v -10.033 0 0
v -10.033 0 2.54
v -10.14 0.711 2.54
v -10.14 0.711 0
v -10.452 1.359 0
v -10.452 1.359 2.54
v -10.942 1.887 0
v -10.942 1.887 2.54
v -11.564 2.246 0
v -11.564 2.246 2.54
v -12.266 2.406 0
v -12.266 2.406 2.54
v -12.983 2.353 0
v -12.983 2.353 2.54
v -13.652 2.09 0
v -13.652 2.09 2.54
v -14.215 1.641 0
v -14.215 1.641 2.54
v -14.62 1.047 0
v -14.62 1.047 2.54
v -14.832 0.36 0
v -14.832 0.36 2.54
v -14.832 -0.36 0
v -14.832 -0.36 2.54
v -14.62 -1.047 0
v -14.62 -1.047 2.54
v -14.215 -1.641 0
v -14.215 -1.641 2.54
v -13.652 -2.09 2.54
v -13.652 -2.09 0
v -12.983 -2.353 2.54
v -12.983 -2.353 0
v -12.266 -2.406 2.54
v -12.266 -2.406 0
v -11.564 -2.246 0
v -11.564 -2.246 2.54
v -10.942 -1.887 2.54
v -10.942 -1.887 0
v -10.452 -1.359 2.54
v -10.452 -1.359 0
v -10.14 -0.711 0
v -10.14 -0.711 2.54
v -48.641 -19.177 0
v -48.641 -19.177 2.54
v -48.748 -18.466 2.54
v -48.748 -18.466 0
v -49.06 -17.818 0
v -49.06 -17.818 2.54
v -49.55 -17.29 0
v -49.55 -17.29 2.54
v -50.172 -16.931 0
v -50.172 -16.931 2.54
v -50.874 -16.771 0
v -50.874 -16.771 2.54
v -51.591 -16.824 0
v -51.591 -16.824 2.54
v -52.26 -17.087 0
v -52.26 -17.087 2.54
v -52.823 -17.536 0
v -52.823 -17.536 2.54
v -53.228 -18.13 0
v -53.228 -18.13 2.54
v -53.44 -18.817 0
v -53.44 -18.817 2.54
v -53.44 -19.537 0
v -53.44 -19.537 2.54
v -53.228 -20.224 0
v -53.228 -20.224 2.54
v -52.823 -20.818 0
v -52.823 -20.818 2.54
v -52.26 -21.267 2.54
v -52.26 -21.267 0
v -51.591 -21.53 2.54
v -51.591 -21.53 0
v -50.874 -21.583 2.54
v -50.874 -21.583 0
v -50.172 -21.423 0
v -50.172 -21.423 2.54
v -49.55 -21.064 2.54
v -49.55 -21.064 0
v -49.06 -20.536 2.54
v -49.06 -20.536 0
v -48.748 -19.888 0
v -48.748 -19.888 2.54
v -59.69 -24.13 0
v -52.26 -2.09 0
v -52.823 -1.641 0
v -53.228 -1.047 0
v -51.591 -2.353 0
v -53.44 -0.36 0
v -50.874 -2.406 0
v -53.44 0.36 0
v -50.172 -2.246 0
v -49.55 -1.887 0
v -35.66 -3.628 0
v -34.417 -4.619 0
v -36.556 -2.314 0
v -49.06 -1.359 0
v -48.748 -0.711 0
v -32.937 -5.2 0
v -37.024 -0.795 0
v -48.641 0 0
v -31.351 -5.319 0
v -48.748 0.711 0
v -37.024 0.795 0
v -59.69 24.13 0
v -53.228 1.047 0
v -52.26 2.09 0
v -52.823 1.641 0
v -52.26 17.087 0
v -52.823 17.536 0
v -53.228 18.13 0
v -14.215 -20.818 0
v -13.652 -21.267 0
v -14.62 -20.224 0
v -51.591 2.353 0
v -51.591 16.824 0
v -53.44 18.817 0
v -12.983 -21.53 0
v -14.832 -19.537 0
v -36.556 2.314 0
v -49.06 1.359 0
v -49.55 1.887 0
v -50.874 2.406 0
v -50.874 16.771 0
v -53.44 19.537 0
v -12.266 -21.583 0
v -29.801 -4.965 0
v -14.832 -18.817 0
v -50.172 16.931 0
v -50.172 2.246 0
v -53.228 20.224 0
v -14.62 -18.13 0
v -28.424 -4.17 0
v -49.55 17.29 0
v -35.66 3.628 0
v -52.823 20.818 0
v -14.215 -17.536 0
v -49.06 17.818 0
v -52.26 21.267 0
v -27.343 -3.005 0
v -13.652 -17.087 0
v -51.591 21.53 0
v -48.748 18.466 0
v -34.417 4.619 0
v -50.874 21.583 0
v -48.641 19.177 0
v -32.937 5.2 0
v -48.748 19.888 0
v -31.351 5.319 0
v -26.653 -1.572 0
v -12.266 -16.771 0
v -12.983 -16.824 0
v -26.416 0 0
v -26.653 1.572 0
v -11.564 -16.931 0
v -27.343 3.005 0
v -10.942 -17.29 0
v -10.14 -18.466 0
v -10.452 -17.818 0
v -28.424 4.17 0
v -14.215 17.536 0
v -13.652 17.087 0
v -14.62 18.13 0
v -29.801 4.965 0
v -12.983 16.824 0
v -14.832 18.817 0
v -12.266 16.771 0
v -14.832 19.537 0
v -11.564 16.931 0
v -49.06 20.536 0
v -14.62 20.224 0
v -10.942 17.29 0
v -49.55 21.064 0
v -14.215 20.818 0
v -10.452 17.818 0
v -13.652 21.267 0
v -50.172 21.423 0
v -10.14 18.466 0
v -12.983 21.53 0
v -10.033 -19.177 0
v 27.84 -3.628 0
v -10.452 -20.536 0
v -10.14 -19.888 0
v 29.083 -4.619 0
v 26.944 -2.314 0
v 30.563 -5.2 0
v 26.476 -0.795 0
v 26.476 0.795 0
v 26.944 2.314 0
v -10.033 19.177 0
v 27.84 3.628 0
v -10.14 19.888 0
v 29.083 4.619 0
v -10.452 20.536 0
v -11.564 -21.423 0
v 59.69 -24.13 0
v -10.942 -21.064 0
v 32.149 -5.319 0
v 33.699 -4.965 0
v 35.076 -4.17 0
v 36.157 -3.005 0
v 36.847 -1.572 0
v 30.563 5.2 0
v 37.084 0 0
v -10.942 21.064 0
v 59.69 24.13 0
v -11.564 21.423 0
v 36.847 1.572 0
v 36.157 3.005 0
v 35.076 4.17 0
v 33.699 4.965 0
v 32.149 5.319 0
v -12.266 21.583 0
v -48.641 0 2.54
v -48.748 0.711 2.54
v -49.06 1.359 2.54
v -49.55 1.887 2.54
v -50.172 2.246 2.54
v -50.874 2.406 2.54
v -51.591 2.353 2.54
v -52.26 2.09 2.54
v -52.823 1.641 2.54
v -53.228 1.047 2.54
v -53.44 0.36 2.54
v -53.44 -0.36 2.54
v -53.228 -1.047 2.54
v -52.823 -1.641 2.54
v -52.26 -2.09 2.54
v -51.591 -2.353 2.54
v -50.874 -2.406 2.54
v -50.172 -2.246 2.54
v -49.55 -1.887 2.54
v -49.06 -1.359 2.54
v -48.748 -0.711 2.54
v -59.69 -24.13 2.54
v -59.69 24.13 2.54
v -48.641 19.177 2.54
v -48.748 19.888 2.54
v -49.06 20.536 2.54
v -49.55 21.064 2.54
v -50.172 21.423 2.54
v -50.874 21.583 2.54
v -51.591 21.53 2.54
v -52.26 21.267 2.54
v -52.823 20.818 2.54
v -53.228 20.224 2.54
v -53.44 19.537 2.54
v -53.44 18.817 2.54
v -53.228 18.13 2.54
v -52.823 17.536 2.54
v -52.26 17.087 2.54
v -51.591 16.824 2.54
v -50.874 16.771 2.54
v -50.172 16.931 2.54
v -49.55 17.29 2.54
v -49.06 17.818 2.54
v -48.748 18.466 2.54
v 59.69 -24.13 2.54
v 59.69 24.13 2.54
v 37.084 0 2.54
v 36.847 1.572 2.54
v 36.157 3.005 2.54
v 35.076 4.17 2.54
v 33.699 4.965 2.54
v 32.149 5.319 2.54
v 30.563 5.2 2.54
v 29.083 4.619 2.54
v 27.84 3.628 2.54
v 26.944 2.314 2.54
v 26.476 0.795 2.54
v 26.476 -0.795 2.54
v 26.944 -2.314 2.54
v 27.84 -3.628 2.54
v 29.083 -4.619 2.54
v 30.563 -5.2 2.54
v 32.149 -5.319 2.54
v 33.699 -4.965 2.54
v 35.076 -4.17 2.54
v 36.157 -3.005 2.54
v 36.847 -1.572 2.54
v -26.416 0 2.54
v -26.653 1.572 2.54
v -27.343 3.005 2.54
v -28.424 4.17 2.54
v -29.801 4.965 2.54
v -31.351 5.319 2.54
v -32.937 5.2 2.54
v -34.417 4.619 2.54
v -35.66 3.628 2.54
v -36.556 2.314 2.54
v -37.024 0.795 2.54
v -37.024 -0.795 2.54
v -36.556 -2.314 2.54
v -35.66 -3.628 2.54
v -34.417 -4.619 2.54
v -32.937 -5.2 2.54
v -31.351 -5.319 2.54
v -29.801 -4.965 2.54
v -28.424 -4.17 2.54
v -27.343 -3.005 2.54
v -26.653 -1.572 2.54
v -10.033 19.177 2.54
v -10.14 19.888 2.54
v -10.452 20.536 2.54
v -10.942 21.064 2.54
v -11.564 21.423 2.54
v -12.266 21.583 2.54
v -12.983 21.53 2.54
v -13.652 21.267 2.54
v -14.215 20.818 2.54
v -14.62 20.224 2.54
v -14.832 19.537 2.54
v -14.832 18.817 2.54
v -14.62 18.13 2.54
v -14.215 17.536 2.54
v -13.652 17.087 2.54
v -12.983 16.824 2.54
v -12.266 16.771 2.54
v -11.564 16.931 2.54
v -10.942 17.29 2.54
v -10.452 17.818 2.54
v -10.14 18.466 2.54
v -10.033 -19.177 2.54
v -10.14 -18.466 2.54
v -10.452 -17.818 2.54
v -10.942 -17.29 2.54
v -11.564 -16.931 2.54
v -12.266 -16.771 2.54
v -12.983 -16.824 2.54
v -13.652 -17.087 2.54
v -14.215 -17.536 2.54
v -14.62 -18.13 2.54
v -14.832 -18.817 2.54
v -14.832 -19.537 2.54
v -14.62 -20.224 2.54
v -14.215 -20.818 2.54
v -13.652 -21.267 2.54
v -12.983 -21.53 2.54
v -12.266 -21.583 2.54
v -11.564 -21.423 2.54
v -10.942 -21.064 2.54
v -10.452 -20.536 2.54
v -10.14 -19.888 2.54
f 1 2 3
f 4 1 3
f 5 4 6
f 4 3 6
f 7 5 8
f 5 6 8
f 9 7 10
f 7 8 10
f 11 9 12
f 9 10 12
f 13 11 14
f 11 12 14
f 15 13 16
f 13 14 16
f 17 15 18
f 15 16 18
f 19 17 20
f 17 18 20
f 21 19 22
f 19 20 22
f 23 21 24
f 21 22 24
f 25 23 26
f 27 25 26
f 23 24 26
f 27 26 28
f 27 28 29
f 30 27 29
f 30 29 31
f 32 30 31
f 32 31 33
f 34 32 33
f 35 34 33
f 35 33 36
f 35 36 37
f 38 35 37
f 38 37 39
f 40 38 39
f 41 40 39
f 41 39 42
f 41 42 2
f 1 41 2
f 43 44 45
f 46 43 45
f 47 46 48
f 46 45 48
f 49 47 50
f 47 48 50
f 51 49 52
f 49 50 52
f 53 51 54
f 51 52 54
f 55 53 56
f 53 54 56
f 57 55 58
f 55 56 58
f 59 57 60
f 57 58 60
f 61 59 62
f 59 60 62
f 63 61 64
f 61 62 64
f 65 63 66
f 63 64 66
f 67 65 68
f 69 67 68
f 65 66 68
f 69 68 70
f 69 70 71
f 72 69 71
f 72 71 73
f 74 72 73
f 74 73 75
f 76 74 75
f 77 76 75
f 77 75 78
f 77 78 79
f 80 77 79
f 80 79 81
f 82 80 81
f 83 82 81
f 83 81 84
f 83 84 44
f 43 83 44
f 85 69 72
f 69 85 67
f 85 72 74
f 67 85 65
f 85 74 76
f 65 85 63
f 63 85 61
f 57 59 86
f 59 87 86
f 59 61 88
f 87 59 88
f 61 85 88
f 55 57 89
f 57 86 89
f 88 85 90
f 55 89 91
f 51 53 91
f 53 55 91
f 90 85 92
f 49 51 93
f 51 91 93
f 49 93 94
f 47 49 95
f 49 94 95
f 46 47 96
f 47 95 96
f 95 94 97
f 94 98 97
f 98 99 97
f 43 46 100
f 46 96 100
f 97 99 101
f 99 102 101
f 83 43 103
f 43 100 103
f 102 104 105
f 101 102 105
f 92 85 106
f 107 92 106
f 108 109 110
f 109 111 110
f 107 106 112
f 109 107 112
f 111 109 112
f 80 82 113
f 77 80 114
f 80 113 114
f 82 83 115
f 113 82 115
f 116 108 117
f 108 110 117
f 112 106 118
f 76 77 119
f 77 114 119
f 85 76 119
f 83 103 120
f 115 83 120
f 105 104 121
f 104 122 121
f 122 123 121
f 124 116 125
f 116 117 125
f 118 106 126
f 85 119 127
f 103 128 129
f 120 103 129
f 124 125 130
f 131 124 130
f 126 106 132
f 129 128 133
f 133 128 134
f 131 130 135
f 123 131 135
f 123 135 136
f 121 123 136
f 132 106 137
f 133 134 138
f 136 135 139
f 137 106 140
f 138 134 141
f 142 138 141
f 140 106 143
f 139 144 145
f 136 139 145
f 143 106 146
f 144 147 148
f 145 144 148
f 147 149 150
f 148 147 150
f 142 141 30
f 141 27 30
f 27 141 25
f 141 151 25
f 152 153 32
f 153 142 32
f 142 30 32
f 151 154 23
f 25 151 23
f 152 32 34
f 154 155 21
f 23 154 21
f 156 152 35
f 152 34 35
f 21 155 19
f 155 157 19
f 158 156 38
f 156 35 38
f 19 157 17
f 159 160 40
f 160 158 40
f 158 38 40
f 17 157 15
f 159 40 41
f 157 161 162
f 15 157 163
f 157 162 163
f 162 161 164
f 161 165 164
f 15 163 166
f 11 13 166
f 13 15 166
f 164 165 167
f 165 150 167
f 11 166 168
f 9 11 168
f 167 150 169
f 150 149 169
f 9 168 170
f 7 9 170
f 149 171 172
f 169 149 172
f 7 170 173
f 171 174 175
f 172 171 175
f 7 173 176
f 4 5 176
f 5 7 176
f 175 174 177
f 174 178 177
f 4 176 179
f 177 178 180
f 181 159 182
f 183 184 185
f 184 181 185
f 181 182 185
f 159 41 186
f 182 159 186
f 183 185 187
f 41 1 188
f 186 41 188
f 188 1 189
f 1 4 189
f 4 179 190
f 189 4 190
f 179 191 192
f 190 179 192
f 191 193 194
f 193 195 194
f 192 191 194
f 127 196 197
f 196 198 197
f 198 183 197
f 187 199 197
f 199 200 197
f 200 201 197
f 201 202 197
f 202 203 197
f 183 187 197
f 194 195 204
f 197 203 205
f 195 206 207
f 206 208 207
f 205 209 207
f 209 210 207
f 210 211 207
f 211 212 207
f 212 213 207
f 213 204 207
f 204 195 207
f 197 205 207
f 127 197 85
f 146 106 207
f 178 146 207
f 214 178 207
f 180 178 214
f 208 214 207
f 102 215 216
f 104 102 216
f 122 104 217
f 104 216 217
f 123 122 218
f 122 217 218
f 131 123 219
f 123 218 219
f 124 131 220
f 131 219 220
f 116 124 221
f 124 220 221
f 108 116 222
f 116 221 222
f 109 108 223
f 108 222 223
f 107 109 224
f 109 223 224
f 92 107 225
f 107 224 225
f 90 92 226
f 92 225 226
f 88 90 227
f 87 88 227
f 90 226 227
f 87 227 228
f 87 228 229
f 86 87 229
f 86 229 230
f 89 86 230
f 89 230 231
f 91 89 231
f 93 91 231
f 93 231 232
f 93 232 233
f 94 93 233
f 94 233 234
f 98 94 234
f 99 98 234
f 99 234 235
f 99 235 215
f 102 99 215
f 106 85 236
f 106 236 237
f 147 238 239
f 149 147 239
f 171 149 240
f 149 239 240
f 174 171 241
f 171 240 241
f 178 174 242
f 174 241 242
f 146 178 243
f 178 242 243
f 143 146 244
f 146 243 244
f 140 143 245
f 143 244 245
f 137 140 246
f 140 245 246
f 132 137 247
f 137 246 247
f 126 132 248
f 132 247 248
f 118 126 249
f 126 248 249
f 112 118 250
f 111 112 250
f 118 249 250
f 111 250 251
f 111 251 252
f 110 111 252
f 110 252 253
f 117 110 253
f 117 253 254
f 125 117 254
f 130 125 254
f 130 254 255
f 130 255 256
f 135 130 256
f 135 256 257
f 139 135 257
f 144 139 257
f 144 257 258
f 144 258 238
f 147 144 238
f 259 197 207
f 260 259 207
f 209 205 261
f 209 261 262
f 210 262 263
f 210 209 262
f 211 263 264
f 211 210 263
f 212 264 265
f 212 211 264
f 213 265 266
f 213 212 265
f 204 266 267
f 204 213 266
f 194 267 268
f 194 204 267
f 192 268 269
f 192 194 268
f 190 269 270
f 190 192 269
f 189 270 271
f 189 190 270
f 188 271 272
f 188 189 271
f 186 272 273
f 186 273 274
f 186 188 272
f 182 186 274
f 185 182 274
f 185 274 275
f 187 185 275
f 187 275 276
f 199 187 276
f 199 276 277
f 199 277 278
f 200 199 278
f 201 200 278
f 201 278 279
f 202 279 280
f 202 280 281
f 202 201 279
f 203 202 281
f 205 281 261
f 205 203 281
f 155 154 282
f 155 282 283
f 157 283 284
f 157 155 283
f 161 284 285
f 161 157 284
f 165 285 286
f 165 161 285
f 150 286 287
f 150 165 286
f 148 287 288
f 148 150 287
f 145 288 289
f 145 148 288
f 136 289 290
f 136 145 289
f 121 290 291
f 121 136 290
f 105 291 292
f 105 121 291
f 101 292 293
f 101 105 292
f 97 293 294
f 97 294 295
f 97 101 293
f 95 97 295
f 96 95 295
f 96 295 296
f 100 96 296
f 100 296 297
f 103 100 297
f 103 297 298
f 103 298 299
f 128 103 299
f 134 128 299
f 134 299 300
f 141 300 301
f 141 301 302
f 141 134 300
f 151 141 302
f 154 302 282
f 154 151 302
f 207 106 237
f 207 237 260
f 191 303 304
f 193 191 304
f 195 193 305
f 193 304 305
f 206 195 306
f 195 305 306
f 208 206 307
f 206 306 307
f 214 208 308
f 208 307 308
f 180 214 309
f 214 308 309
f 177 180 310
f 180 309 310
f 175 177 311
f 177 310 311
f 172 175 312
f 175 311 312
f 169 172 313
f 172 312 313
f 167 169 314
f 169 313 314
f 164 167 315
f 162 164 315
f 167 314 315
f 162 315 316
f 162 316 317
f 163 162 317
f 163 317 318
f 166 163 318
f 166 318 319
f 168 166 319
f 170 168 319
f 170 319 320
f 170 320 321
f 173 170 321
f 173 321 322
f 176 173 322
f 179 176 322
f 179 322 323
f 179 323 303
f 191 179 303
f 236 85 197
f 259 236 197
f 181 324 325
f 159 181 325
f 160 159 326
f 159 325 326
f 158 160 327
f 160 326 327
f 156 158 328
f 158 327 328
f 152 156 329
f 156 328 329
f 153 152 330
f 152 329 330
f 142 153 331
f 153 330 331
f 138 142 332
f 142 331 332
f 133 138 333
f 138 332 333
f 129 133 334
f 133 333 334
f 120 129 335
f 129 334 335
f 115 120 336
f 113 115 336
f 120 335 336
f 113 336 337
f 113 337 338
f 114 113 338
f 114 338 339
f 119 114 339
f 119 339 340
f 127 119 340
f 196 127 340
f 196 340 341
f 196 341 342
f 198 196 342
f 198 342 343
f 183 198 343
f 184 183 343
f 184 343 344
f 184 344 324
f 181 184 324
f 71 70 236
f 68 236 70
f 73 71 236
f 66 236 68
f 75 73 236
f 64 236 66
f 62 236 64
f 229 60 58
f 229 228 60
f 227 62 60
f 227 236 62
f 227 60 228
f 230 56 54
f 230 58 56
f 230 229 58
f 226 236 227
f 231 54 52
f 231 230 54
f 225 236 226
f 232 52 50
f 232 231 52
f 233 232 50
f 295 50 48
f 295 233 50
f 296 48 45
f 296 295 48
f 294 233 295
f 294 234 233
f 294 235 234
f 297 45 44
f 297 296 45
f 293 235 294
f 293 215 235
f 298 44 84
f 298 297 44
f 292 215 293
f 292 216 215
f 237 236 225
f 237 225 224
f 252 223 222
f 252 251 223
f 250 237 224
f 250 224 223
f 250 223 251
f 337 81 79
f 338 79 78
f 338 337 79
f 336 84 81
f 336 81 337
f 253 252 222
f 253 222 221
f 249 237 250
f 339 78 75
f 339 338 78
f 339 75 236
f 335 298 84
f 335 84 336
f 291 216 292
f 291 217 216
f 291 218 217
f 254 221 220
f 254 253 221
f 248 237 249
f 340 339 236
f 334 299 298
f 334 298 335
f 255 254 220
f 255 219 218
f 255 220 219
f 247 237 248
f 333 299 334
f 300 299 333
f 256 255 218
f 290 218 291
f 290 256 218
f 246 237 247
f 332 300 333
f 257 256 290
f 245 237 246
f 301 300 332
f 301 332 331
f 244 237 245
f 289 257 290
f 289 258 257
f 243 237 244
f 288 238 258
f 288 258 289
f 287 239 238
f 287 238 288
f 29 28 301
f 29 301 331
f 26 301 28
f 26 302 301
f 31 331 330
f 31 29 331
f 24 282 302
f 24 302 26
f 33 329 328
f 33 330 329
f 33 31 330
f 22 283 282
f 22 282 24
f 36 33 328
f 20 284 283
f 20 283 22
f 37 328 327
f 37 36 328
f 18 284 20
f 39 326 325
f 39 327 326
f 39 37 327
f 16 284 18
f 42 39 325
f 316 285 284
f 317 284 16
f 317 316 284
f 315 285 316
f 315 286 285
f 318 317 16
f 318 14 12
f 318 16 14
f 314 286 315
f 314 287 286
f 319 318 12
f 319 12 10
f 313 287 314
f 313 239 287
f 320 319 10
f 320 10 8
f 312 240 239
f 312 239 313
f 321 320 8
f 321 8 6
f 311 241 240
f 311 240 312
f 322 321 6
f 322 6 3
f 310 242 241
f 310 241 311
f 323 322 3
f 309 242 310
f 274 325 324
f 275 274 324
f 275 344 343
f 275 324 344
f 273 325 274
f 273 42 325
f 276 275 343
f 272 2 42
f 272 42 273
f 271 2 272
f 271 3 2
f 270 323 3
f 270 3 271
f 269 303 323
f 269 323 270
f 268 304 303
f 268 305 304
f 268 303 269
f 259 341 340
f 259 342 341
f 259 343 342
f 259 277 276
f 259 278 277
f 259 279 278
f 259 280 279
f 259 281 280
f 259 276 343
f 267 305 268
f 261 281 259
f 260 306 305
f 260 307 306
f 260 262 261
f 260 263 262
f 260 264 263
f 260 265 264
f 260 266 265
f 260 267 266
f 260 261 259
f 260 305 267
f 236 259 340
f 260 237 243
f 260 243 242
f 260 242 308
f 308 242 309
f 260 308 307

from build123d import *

# Parameters (mm, degrees)
F0_W     = 119.38
F0_H     = 48.26
F0_R     = 5.334
F1_DEPTH = 2.54
F2_DEPTH = 2.54
F3_R     = 2.413
F4_DEPTH = 2.541
F5_R     = 2.413
F6_DEPTH = 2.541


with BuildPart() as f1:
    # F0 (on Top) → F1 (new body)
    with BuildSketch(Plane.XY):
        Rectangle(F0_W, F0_H)
        with Locations((-31.75, 0)):
            Circle(F0_R, mode=Mode.SUBTRACT)
        with Locations((31.75, 0)):
            Circle(F0_R, mode=Mode.SUBTRACT)
    extrude(amount=F1_DEPTH)

    # F0 (on Top) → F2 (join)
    with BuildSketch(Plane.XY):
        Rectangle(F0_W, F0_H)
        with Locations((-31.75, 0)):
            Circle(F0_R, mode=Mode.SUBTRACT)
        with Locations((31.75, 0)):
            Circle(F0_R, mode=Mode.SUBTRACT)
    extrude(amount=F2_DEPTH)

    # F3 (on face) → F4 (cut, through all)
    with BuildSketch(Plane.XY.offset(2.54)):
        with Locations((-51.054, 0)):
            Circle(F3_R)
        with Locations((-51.054, 19.177)):
            Circle(F3_R)
        with Locations((-51.054, -19.177)):
            Circle(F3_R)
    extrude(amount=-F4_DEPTH, mode=Mode.SUBTRACT)

    # F5 (on face) → F6 (cut, through all)
    with BuildSketch(Plane.XY.offset(2.54)):
        with Locations((-12.446, 0)):
            Circle(F5_R)
        with Locations((-12.446, 19.177)):
            Circle(F5_R)
        with Locations((-12.446, -19.177)):
            Circle(F5_R)
    extrude(amount=-F6_DEPTH, mode=Mode.SUBTRACT)


solid = f1.part
